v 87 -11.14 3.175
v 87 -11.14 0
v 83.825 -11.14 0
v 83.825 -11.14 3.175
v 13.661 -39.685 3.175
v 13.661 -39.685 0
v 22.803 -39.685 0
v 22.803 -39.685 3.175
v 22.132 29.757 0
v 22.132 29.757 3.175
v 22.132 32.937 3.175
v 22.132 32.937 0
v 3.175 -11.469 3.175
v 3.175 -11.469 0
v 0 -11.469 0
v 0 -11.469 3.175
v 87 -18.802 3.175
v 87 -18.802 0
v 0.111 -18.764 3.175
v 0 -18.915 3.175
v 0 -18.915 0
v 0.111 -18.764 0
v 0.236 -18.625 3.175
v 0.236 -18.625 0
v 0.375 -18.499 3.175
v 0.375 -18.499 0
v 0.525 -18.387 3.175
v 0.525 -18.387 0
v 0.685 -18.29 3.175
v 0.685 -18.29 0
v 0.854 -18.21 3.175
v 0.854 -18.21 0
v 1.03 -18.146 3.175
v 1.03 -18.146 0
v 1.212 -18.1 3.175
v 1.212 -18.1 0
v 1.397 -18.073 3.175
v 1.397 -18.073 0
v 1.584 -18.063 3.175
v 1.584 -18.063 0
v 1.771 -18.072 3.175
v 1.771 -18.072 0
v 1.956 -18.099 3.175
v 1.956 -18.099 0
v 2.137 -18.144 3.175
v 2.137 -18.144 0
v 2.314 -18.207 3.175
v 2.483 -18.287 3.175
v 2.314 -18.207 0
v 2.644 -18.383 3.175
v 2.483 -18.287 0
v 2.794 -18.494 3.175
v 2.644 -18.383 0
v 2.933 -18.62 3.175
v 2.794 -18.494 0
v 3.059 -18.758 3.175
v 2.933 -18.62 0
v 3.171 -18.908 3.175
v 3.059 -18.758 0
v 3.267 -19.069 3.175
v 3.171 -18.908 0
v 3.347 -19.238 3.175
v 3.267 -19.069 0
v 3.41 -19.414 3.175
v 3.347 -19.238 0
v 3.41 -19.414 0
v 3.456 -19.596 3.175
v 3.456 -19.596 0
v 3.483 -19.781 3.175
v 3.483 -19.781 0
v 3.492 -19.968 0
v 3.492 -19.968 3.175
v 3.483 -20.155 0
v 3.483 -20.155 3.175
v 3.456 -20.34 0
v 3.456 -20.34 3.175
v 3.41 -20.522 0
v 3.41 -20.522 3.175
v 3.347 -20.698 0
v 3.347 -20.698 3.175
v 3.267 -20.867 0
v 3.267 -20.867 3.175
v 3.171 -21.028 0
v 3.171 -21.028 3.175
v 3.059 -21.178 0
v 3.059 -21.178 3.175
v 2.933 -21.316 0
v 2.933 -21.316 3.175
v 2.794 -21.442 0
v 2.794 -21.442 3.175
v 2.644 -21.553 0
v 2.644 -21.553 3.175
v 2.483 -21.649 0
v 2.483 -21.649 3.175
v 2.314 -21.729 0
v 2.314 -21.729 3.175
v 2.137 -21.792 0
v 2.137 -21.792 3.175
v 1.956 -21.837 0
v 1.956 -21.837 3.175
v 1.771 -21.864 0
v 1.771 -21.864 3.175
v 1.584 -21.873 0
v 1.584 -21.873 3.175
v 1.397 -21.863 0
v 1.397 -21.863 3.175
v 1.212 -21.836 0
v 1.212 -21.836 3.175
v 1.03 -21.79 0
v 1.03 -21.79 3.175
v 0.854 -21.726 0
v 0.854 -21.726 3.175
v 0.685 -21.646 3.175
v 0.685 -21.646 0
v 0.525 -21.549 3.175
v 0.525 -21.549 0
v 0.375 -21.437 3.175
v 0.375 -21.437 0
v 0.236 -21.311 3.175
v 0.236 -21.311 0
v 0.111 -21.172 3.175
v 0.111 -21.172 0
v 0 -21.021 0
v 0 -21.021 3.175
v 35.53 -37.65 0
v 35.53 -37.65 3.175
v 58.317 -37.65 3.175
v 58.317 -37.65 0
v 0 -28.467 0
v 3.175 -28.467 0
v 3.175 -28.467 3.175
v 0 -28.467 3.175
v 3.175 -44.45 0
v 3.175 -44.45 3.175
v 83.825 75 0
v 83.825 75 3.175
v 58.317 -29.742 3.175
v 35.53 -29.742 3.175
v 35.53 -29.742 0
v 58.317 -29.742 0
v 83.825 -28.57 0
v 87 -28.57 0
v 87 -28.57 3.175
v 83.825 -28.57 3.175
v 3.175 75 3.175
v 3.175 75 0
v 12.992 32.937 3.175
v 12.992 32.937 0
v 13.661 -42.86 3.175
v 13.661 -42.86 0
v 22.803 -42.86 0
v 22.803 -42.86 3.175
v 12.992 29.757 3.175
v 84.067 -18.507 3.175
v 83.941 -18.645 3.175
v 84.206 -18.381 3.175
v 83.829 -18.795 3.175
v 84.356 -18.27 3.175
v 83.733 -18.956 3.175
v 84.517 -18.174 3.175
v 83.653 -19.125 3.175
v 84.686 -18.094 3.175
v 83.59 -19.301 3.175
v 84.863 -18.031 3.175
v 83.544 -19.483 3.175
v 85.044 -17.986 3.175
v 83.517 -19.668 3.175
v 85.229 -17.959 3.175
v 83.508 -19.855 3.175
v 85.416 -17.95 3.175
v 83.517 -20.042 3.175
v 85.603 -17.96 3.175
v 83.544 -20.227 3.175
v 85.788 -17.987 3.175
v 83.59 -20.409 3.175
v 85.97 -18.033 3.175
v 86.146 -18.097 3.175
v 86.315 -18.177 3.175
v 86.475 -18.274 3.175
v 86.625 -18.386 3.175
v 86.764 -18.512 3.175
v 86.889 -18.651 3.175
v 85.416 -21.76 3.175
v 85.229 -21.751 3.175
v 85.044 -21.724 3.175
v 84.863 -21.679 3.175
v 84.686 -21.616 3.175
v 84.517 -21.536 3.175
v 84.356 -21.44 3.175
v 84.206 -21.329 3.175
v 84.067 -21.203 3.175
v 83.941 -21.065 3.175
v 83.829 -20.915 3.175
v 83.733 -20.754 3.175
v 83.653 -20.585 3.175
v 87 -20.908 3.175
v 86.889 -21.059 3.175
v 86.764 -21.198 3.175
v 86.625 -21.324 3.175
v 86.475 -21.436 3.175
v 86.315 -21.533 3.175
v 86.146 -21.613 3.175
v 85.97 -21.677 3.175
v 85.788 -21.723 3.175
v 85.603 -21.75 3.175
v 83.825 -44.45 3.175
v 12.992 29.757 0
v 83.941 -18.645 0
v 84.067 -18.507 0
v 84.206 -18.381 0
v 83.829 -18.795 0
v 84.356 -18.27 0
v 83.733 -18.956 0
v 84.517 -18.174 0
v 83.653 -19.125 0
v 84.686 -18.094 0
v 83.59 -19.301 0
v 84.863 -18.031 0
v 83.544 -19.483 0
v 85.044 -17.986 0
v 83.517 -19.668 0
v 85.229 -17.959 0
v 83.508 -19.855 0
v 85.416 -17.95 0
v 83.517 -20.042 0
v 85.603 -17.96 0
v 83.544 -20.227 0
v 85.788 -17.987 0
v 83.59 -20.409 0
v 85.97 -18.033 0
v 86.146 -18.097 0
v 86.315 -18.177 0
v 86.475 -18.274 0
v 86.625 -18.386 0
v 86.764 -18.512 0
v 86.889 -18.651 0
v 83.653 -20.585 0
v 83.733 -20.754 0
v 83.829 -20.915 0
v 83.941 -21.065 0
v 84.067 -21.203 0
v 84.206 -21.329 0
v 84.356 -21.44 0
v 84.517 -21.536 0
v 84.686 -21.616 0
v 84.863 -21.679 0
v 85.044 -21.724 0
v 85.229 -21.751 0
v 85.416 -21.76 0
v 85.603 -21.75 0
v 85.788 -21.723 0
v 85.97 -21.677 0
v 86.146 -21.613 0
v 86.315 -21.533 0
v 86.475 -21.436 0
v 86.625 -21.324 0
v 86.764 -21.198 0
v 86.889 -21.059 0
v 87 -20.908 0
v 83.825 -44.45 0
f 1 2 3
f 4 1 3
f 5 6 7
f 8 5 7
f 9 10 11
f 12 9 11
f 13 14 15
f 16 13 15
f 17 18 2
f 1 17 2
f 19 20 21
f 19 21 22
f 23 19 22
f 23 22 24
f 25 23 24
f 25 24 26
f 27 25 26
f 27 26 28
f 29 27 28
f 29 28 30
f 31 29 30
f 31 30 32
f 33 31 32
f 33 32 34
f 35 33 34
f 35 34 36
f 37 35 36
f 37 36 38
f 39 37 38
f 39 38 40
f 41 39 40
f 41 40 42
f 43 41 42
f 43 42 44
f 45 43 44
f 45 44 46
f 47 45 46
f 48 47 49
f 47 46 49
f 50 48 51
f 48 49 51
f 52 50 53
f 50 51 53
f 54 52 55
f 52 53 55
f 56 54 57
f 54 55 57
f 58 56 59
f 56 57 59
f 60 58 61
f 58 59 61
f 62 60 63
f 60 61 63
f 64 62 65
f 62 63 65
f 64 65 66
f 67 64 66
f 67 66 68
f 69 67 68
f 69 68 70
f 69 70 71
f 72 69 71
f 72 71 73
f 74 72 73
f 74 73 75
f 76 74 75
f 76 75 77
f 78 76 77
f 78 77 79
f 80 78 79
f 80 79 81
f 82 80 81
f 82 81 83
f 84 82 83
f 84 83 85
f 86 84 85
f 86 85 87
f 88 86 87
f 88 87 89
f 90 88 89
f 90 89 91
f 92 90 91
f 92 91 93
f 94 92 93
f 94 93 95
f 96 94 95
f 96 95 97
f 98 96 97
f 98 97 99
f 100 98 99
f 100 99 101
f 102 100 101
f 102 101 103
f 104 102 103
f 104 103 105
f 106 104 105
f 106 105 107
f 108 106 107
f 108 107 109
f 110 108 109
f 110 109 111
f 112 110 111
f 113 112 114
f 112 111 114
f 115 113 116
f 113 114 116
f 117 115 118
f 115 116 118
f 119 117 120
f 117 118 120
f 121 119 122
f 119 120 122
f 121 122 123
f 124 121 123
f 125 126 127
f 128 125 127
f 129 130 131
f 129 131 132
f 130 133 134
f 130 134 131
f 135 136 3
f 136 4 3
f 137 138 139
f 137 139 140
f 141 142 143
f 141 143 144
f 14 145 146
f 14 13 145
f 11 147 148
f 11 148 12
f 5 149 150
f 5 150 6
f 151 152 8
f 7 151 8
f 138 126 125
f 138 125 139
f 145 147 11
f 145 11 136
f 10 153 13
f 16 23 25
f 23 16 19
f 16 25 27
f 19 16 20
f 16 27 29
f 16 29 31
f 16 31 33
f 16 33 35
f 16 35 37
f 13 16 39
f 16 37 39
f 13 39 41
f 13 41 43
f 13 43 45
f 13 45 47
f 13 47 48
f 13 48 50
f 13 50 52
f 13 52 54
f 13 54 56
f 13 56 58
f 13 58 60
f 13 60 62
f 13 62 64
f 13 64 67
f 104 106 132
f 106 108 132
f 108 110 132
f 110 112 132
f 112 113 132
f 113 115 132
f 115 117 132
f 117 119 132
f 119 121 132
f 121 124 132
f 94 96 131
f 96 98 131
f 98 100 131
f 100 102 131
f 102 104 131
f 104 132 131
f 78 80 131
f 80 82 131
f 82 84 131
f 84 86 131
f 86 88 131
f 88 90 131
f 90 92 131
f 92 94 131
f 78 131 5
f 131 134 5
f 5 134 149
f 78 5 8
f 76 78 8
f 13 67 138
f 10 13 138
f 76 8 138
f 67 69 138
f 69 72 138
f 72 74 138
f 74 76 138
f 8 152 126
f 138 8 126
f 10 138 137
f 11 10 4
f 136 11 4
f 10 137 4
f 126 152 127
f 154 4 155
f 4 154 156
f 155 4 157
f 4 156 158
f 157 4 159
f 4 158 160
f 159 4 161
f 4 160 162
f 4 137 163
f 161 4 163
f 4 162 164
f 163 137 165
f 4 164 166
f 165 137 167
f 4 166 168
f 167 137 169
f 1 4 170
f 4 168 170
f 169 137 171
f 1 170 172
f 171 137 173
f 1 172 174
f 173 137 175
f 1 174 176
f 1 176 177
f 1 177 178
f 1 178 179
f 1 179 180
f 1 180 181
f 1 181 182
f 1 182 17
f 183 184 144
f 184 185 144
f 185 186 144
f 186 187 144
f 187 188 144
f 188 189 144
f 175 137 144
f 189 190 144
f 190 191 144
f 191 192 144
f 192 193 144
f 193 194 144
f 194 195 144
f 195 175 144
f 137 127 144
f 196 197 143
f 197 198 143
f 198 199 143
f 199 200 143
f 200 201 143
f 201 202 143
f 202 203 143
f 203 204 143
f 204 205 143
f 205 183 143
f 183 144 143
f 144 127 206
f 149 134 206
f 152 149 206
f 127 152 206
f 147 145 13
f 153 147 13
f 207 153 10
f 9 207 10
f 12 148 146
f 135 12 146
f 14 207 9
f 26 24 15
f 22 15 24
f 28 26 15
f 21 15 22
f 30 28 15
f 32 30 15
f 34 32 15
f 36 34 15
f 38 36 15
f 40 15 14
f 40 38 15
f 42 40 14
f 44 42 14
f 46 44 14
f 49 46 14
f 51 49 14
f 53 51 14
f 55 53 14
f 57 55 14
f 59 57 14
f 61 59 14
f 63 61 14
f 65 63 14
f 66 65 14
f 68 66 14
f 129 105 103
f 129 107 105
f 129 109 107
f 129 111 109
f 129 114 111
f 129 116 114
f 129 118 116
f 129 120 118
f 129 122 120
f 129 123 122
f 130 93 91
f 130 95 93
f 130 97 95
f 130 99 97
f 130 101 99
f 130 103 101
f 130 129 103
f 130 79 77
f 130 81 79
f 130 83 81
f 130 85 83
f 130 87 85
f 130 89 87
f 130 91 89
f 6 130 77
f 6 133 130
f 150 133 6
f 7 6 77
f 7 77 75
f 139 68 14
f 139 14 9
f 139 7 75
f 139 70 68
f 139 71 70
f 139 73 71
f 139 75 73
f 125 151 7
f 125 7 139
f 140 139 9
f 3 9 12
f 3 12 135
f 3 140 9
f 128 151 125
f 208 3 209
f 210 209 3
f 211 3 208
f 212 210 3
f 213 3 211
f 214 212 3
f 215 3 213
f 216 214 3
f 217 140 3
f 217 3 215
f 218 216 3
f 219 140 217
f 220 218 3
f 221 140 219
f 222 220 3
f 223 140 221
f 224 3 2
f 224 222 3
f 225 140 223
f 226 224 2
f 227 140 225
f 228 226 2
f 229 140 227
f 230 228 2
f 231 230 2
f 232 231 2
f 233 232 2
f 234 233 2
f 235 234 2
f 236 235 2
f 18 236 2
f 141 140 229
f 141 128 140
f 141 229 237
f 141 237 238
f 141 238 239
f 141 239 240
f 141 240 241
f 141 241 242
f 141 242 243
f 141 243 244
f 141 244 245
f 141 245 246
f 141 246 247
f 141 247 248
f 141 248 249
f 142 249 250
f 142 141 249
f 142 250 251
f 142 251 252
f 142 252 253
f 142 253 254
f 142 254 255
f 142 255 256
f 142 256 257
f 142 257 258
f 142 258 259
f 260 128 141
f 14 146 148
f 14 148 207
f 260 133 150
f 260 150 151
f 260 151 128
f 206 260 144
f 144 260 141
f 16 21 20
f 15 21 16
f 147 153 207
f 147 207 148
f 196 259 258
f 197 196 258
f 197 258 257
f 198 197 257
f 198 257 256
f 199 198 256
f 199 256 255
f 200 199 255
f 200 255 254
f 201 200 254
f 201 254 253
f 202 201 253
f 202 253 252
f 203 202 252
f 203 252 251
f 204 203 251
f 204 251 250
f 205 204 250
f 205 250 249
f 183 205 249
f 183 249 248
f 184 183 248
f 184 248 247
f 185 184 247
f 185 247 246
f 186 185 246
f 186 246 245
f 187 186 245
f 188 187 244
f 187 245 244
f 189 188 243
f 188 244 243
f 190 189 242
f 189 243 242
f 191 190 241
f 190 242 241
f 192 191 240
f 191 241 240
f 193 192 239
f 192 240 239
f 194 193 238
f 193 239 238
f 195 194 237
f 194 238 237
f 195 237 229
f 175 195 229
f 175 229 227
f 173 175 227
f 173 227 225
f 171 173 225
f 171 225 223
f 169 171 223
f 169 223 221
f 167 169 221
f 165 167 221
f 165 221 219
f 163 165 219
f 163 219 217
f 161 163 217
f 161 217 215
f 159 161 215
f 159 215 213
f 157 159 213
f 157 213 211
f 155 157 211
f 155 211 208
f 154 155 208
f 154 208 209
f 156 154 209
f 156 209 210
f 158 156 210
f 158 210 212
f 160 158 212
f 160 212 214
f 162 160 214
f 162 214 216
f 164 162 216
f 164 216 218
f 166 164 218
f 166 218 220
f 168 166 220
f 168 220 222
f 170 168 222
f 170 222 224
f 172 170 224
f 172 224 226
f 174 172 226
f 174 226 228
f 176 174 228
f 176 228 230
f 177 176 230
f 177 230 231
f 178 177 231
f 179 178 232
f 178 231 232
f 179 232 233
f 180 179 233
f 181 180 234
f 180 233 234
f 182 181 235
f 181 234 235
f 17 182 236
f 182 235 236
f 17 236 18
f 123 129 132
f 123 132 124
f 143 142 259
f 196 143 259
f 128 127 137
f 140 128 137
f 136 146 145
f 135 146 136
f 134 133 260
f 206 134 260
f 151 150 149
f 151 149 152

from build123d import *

# Parameters (mm, degrees)
SKETCH1_W           = 87
SKETCH1_H           = 44.45
SKETCH1_W_2         = 9.142679105
SKETCH1_H_2         = 3.175
BOSS_EXTRUDE1_DEPTH = 3.175
SKETCH2_W           = 3.175
SKETCH2_H           = 11.14
CUT_EXTRUDE1_DEPTH  = 4.175
SKETCH3_W           = 3.175
SKETCH3_H           = 15.88
CUT_EXTRUDE2_DEPTH  = 4.175
SKETCH6_R           = 1.905
CUT_EXTRUDE3_DEPTH  = 4.175
SKETCH8_W           = 3.175
SKETCH8_H           = 11.469011162
SKETCH8_H_2         = 15.983017012
CUT_EXTRUDE4_DEPTH  = 4.175
SKETCH10_R          = 1.905
CUT_EXTRUDE5_DEPTH  = 4.175
SKETCH12_W          = 80.65
SKETCH12_H          = 3.175
BOSS_EXTRUDE2_DEPTH = 75
SKETCH18_W          = 9.14
SKETCH18_H          = 3.18
CUT_EXTRUDE6_DEPTH  = 3.18
SKETCH19_W          = 22.786874906
SKETCH19_H          = 7.908464624
CUT_EXTRUDE7_DEPTH  = 3.18


with BuildPart() as part:
    # Sketch1 → Boss-Extrude1 (new body)
    with BuildSketch(Plane.XY):
        with Locations((43.5, -22.225)):
            Rectangle(SKETCH1_W, SKETCH1_H)
        with Locations((18.232073224, -41.2725)):
            Rectangle(SKETCH1_W_2, SKETCH1_H_2, mode=Mode.SUBTRACT)
    extrude(amount=BOSS_EXTRUDE1_DEPTH)

    # Sketch2 → Cut-Extrude1 (cut, through all)
    with BuildSketch(Plane(origin=(0, 0, 0), x_dir=(-1, 0, 0), z_dir=(0, 0, -1))):
        with Locations((-85.4125, -5.57)):
            Rectangle(SKETCH2_W, SKETCH2_H)
    extrude(amount=-CUT_EXTRUDE1_DEPTH, mode=Mode.SUBTRACT)

    # Sketch3 → Cut-Extrude2 (cut, through all)
    with BuildSketch(Plane(origin=(0, 0, 0), x_dir=(-1, 0, 0), z_dir=(0, 0, -1))):
        with Locations((-85.4125, -36.51)):
            Rectangle(SKETCH3_W, SKETCH3_H)
    extrude(amount=-CUT_EXTRUDE2_DEPTH, mode=Mode.SUBTRACT)

    # Sketch6 → Cut-Extrude3 (cut, through all)
    with BuildSketch(Plane(origin=(0, 0, 0), x_dir=(-1, 0, 0), z_dir=(0, 0, -1))):
        with Locations((-85.4125, -19.855)):
            Circle(SKETCH6_R)
    extrude(amount=-CUT_EXTRUDE3_DEPTH, mode=Mode.SUBTRACT)

    # Sketch8 → Cut-Extrude4 (cut, through all)
    with BuildSketch(Plane(origin=(0, 0, 0), x_dir=(-1, 0, 0), z_dir=(0, 0, -1))):
        with Locations((-1.5875, -5.734505581)):
            Rectangle(SKETCH8_W, SKETCH8_H)
        with Locations((-1.5875, -36.458491494)):
            Rectangle(SKETCH8_W, SKETCH8_H_2)
    extrude(amount=-CUT_EXTRUDE4_DEPTH, mode=Mode.SUBTRACT)

    # Sketch10 → Cut-Extrude5 (cut, through all)
    with BuildSketch(Plane(origin=(0, 0, 0), x_dir=(-1, 0, 0), z_dir=(0, 0, -1))):
        with Locations((-1.5875, -19.967997075)):
            Circle(SKETCH10_R)
    extrude(amount=-CUT_EXTRUDE5_DEPTH, mode=Mode.SUBTRACT)

    # Sketch12 → Boss-Extrude2 (add)
    with BuildSketch(Plane(origin=(0, 0, 0), x_dir=(1, 0, 0), z_dir=(0, 1, 0))):
        with Locations((43.5, -1.5875)):
            Rectangle(SKETCH12_W, SKETCH12_H)
    extrude(amount=BOSS_EXTRUDE2_DEPTH)

    # Sketch18 → Cut-Extrude6 (cut)
    with BuildSketch(Plane.XY.offset(3.175)):
        with Locations((17.561709366, 31.346582601)):
            Rectangle(SKETCH18_W, SKETCH18_H)
    extrude(amount=-CUT_EXTRUDE6_DEPTH, mode=Mode.SUBTRACT)

    # Sketch19 → Cut-Extrude7 (cut)
    with BuildSketch(Plane.XY.offset(3.175)):
        with Locations((46.923268397, -33.695818912)):
            Rectangle(SKETCH19_W, SKETCH19_H)
    extrude(amount=-CUT_EXTRUDE7_DEPTH, mode=Mode.SUBTRACT)


solid = part.part
